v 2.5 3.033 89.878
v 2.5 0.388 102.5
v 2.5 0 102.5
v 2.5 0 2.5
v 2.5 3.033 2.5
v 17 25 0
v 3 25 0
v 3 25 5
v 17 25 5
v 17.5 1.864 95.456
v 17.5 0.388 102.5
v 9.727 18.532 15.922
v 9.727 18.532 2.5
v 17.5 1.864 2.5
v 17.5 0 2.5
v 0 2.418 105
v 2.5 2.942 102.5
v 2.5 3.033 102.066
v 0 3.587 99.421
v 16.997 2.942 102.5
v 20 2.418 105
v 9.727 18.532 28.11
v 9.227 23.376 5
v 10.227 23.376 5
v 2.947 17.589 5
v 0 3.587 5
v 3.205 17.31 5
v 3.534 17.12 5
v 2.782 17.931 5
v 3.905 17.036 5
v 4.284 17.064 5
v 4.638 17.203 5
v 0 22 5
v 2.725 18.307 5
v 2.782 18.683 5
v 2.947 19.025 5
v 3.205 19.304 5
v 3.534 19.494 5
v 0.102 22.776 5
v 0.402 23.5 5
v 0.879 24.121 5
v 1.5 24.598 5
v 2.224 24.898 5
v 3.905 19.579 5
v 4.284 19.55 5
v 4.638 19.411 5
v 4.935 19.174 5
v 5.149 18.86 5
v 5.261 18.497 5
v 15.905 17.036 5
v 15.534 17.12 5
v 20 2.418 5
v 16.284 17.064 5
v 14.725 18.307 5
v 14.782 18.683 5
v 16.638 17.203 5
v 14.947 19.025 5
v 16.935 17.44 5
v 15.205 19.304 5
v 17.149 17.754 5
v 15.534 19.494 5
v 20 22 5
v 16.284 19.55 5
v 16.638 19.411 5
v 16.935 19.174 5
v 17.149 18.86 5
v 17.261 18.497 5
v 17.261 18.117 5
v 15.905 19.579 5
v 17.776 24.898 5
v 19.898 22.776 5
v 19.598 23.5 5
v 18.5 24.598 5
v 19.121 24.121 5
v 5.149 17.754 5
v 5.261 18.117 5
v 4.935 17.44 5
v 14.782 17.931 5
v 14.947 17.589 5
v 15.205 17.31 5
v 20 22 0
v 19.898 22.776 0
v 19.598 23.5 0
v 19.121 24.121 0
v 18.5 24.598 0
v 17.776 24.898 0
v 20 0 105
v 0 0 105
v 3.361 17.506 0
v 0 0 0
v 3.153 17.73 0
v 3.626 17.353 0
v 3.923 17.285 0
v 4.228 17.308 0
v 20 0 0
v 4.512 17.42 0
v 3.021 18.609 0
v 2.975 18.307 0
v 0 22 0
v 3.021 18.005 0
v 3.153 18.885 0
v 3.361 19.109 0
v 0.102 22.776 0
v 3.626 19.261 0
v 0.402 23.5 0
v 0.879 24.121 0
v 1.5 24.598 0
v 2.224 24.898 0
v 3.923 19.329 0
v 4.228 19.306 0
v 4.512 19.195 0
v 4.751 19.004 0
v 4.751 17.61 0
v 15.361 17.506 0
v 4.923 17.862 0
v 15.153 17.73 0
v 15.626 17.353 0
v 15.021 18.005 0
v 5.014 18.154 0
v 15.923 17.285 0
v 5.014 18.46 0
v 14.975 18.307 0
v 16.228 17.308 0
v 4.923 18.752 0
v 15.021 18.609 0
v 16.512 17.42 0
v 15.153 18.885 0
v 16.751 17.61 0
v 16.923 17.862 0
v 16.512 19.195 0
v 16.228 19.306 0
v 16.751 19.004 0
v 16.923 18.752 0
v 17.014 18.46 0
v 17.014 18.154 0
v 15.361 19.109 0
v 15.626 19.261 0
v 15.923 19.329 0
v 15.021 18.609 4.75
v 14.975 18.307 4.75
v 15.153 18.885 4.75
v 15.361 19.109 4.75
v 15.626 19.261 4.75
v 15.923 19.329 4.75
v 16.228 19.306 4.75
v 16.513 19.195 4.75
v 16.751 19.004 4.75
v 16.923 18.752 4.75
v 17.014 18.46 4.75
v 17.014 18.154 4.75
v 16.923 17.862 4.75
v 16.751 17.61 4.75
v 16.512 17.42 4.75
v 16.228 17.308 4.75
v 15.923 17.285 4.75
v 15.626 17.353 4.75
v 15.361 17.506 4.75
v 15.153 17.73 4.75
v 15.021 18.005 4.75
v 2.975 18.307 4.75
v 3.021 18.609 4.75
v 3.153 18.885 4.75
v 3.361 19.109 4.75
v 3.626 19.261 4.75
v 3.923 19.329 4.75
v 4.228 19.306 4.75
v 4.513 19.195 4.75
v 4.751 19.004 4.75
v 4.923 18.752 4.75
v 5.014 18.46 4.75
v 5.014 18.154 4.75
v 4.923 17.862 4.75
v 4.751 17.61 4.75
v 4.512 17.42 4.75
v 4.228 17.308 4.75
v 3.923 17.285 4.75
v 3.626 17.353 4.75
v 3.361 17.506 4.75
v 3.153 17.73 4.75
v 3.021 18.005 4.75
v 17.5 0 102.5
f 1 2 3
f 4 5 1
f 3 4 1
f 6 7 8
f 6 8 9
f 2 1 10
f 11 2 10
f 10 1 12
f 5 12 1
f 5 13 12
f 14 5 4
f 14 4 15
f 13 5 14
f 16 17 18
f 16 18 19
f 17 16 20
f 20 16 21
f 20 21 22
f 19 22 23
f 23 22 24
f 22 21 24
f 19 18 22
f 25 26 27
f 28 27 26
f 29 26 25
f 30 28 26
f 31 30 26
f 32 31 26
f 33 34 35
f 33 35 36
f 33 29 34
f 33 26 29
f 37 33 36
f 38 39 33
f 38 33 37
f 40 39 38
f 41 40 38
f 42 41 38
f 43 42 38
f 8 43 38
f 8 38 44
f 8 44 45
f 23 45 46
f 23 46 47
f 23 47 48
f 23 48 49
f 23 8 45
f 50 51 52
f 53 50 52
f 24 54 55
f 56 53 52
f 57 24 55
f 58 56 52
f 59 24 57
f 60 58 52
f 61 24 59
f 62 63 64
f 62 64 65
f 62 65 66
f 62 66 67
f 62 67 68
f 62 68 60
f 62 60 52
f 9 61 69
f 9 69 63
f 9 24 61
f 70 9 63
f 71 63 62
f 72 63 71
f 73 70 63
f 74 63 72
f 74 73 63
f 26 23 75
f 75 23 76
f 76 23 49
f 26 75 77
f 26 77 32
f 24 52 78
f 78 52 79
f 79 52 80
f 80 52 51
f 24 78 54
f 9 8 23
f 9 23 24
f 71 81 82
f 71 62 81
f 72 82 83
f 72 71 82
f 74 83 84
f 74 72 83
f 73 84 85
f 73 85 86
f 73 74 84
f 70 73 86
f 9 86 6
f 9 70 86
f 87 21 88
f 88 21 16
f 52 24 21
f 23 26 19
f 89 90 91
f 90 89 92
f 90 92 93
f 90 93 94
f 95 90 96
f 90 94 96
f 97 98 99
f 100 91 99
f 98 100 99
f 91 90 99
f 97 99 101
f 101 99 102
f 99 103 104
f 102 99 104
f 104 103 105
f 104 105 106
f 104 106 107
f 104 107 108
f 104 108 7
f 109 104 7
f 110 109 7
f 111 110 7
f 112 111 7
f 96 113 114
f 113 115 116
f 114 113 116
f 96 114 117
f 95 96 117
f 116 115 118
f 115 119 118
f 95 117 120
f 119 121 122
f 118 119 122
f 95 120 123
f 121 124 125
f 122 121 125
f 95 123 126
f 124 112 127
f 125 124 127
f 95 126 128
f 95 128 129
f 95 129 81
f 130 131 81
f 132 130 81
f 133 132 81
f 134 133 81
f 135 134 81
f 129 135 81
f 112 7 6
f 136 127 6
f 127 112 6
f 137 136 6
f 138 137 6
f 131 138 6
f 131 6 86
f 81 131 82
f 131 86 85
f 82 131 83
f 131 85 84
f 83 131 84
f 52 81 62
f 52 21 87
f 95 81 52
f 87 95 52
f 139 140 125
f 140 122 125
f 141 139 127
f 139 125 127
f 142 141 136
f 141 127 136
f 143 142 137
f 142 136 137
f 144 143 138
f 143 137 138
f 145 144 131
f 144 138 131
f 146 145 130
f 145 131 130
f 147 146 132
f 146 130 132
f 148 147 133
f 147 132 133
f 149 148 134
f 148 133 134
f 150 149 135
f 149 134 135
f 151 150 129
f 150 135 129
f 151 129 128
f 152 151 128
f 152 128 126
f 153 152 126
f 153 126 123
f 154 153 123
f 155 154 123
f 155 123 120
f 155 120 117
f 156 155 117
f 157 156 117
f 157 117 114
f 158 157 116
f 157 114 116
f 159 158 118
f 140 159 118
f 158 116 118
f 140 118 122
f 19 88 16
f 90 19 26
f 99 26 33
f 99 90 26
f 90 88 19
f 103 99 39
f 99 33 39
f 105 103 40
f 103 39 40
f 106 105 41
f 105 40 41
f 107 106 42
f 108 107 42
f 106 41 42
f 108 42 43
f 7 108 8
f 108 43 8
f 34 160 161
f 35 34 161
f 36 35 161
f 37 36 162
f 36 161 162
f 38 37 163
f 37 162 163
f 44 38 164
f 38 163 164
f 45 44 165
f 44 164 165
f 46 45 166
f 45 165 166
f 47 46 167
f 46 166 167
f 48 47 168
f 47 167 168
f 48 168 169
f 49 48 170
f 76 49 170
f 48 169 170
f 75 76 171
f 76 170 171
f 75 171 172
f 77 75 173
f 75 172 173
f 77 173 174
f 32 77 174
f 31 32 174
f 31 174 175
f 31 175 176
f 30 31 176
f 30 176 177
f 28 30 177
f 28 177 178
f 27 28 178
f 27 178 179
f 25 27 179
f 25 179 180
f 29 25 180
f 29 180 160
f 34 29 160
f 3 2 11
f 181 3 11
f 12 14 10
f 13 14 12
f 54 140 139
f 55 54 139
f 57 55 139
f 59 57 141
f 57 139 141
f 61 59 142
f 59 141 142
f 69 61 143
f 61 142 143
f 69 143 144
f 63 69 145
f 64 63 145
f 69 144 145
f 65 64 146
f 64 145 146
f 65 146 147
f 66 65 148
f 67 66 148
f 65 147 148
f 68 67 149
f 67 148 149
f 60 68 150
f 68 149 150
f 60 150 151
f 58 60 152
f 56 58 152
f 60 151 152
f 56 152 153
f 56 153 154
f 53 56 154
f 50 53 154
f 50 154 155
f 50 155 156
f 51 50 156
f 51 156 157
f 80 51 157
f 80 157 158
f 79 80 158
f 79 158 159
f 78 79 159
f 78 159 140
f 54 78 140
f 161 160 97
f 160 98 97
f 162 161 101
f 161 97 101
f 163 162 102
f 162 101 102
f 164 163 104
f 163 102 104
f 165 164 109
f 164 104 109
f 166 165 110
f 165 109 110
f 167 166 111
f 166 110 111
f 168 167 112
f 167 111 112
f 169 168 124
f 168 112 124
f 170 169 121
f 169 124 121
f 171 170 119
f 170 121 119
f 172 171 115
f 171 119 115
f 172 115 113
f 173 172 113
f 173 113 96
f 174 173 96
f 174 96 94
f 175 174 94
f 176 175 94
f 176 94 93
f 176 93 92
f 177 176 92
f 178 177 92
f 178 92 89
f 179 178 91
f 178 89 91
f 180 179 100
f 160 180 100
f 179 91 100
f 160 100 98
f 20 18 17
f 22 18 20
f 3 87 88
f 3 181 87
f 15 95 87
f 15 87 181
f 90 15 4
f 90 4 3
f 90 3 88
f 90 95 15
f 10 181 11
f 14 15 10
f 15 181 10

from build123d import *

# Parameters (mm, degrees)
SKETCH1_W                          = 20
SKETCH1_H                          = 25
BOSS_EXTRUDE1_DEPTH                = 5
BOSS_EXTRUDE3_DEPTH                = 100
CUT_EXTRUDE2_DEPTH                 = 110.772492001
FILLET1_R                          = 3
SHELL1_START                       = 2.5
SHELL1_DEPTH                       = 13.421878312
SHELL1_START_2                     = 15.921878312
SHELL1_2_DEPTH                     = 86.578121688
SHELL1_START_3                     = 21.404196581
SHELL1_3_DEPTH                     = 2.5
M2_5X0_45_TAPPED_HOLE2_D           = 2.05
M2_5X0_45_TAPPED_HOLE2_CSINK_D     = 2.55
M2_5X0_45_TAPPED_HOLE2_CSINK_ANGLE = 90


with BuildPart() as part:
    # Sketch1 → Boss-Extrude1 (new body)
    with BuildSketch(Plane.XY):
        with Locations((10, 12.5)):
            Rectangle(SKETCH1_W, SKETCH1_H)
    extrude(amount=BOSS_EXTRUDE1_DEPTH)

    # Sketch2 → Boss-Extrude3 (add)
    with BuildSketch(Plane.XY.offset(5)):
        Polygon((0, 0), (0, 3.587380473), (9.227415524, 23.375636922), (10.227415524, 23.375636922), (20, 2.418261881), (20, 0), align=None)
    extrude(amount=BOSS_EXTRUDE3_DEPTH)

    # Sketch3 → Cut-Extrude2 (cut, through all)
    with BuildSketch(Plane(origin=(20, 0, 0), x_dir=(0, 0, -1), z_dir=(1, 0, 0))):
        Polygon((-105, 2.418261881), (-5, 23.375636922), (-105, 23.375636922), align=None)
    extrude(amount=-CUT_EXTRUDE2_DEPTH, mode=Mode.SUBTRACT)

    # Fillet1
    fillet1_edges = [part.edges().sort_by_distance(p)[0] for p in [
        (0, 25, 2.5),
        (20, 25, 2.5),
    ]]
    fillet(fillet1_edges, radius=FILLET1_R)

    # Shell1: read off the stored shape, not the designer's step
    # Shell1 outline → Shell1 (cut)
    with BuildSketch(Plane.XY.offset(SHELL1_START)):
        Polygon((2.5, 3.033143816), (2.5, 0), (17.5, 0), (17.5, 1.864025225), (9.727415524, 18.532386424), align=None)
    extrude(amount=SHELL1_DEPTH, mode=Mode.SUBTRACT)

    # Shell1 2 outline → Shell1 2 (cut)
    with BuildSketch(Plane.XY.offset(SHELL1_START_2)):
        Polygon((2.5, 3.033143816), (2.5, 0), (17.5, 0), (17.5, 1.864025225), (9.727415524, 18.532386424), align=None)
    extrude(amount=SHELL1_2_DEPTH, mode=Mode.SUBTRACT)

    # Shell1 3 outline → Shell1 3 (add)
    with BuildSketch(Plane(origin=(0, 0, 0), x_dir=(1, 0, 0), z_dir=(0, 0.9787373237991824, 0.2051176516110071)).offset(SHELL1_START_3)):
        Polygon((17.5, -93.044458657), (9.727415524, -11.782016987), (2.5, -87.344712281), (2.5, -100.241013679), (17.5, -100.241013679), align=None)
    extrude(amount=SHELL1_3_DEPTH)

    # M2.5x0.45 Tapped Hole2 (through all)
    with Locations(Plane.XY.offset(5)):
        with Locations((16, 18.307180682), (4, 18.307180682)):
            CounterSinkHole(M2_5X0_45_TAPPED_HOLE2_D / 2, M2_5X0_45_TAPPED_HOLE2_CSINK_D / 2, counter_sink_angle=M2_5X0_45_TAPPED_HOLE2_CSINK_ANGLE)


solid = part.part
